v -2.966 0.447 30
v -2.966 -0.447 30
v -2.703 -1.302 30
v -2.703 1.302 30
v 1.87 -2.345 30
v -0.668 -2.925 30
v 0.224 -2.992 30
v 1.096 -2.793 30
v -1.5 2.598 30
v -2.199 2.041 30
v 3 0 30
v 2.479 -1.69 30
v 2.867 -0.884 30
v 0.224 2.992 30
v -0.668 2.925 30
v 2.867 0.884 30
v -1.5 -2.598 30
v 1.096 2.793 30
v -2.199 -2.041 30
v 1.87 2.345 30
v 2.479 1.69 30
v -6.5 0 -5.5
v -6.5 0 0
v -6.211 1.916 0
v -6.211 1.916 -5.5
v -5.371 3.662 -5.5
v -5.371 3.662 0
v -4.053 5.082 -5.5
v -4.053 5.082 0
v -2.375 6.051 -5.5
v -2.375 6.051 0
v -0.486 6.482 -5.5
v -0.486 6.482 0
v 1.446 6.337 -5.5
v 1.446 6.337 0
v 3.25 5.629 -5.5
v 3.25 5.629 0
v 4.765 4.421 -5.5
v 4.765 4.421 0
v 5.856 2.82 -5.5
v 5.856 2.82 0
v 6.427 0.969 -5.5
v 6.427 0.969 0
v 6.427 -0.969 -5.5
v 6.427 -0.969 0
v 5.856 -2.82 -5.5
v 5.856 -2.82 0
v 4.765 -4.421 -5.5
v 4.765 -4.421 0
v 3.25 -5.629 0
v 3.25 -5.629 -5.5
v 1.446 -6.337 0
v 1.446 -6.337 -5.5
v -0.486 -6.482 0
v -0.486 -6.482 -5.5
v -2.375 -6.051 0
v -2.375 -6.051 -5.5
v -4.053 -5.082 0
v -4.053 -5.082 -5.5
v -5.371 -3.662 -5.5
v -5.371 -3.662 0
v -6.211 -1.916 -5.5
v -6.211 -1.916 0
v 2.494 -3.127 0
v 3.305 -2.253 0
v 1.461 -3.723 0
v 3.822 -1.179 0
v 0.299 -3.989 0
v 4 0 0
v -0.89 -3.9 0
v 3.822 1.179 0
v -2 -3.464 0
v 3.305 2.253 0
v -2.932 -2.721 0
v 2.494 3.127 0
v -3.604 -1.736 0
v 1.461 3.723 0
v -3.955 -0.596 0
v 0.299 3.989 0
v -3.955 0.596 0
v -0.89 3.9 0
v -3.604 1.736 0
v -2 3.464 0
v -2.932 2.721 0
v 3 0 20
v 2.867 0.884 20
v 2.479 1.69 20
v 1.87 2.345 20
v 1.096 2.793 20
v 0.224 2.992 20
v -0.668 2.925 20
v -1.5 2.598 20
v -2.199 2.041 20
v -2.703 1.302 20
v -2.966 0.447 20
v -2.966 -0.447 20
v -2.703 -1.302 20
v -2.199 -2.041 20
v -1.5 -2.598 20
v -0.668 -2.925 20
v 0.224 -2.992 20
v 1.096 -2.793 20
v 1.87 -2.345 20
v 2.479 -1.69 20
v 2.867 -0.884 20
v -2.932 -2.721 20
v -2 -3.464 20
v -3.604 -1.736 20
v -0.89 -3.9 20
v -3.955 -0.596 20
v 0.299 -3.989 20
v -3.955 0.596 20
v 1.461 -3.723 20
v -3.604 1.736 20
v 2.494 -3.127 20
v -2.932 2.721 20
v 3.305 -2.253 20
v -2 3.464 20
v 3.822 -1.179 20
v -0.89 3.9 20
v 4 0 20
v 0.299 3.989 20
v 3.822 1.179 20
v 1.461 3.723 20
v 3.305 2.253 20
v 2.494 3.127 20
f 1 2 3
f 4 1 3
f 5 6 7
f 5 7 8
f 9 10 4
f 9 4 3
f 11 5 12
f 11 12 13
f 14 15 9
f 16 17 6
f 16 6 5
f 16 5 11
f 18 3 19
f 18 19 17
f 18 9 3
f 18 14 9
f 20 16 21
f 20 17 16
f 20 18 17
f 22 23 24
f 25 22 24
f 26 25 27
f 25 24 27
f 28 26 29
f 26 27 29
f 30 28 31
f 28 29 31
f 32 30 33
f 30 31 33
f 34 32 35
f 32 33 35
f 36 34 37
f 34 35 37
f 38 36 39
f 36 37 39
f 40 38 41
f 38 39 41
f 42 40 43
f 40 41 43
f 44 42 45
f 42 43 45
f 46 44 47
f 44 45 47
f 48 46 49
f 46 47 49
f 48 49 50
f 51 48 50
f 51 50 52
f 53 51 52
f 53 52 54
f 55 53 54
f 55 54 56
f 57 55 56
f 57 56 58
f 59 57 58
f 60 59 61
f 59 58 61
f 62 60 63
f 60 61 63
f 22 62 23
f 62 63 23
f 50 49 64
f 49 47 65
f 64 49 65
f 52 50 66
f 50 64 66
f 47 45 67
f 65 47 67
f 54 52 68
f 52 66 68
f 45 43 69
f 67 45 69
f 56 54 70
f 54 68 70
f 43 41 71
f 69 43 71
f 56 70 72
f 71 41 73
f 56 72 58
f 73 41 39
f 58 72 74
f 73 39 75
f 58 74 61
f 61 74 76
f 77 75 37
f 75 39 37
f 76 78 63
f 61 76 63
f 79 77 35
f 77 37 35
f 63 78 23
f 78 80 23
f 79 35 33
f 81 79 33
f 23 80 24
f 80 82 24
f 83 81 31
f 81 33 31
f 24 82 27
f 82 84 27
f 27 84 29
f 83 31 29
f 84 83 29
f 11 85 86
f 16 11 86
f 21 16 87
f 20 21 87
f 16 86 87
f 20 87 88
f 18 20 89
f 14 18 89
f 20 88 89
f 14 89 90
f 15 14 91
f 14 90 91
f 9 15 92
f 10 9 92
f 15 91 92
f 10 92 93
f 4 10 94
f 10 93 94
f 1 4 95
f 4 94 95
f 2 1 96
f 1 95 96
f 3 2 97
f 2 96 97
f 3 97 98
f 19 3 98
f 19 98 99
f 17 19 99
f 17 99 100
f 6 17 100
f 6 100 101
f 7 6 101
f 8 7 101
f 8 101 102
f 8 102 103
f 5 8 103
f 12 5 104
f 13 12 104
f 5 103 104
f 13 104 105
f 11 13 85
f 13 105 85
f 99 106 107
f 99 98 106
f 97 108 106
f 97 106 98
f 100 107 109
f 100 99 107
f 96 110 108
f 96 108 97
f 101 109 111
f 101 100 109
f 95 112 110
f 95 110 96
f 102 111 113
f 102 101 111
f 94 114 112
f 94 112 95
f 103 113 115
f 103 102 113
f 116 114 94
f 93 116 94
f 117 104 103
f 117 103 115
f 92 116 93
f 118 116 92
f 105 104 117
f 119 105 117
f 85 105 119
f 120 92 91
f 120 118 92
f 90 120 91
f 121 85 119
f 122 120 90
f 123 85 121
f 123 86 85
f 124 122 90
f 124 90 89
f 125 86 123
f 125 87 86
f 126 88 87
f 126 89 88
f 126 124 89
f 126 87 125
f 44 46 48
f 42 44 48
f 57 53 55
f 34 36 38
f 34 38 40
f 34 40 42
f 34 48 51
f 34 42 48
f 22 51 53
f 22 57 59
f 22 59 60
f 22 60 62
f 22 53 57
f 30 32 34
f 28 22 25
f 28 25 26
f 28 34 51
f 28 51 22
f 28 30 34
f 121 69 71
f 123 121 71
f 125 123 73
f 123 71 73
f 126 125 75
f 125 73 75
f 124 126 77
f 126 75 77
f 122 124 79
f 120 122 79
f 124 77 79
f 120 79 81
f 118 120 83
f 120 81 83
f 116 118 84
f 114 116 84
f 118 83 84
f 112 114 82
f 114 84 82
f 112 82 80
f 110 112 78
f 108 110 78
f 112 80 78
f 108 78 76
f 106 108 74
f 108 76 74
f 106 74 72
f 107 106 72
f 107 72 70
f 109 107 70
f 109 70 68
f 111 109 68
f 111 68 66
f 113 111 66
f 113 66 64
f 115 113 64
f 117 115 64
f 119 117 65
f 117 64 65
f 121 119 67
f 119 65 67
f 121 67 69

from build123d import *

# Parameters (mm, degrees)
SZKIC1_R                    = 4
DODANIE_WYCI_GNI_CIE1_DEPTH = 20
SZKIC2_R                    = 6.5
DODANIE_WYCI_GNI_CIE2_DEPTH = 5.5
SZKIC3_R                    = 3
DODANIE_WYCI_GNI_CIE3_DEPTH = 10


with BuildPart() as part:
    # Szkic1 → Dodanie-wyciągnięcie1 (new body)
    with BuildSketch(Plane.XY):
        Circle(SZKIC1_R)
    extrude(amount=DODANIE_WYCI_GNI_CIE1_DEPTH)

    # Szkic2 → Dodanie-wyciągnięcie2 (add)
    with BuildSketch(Plane(origin=(0, 0, 0), x_dir=(-1, 0, 0), z_dir=(0, 0, -1))):
        Circle(SZKIC2_R)
    extrude(amount=DODANIE_WYCI_GNI_CIE2_DEPTH)

    # Szkic3 → Dodanie-wyciągnięcie3 (add)
    with BuildSketch(Plane.XY.offset(20)):
        Circle(SZKIC3_R)
    extrude(amount=DODANIE_WYCI_GNI_CIE3_DEPTH)


solid = part.part
